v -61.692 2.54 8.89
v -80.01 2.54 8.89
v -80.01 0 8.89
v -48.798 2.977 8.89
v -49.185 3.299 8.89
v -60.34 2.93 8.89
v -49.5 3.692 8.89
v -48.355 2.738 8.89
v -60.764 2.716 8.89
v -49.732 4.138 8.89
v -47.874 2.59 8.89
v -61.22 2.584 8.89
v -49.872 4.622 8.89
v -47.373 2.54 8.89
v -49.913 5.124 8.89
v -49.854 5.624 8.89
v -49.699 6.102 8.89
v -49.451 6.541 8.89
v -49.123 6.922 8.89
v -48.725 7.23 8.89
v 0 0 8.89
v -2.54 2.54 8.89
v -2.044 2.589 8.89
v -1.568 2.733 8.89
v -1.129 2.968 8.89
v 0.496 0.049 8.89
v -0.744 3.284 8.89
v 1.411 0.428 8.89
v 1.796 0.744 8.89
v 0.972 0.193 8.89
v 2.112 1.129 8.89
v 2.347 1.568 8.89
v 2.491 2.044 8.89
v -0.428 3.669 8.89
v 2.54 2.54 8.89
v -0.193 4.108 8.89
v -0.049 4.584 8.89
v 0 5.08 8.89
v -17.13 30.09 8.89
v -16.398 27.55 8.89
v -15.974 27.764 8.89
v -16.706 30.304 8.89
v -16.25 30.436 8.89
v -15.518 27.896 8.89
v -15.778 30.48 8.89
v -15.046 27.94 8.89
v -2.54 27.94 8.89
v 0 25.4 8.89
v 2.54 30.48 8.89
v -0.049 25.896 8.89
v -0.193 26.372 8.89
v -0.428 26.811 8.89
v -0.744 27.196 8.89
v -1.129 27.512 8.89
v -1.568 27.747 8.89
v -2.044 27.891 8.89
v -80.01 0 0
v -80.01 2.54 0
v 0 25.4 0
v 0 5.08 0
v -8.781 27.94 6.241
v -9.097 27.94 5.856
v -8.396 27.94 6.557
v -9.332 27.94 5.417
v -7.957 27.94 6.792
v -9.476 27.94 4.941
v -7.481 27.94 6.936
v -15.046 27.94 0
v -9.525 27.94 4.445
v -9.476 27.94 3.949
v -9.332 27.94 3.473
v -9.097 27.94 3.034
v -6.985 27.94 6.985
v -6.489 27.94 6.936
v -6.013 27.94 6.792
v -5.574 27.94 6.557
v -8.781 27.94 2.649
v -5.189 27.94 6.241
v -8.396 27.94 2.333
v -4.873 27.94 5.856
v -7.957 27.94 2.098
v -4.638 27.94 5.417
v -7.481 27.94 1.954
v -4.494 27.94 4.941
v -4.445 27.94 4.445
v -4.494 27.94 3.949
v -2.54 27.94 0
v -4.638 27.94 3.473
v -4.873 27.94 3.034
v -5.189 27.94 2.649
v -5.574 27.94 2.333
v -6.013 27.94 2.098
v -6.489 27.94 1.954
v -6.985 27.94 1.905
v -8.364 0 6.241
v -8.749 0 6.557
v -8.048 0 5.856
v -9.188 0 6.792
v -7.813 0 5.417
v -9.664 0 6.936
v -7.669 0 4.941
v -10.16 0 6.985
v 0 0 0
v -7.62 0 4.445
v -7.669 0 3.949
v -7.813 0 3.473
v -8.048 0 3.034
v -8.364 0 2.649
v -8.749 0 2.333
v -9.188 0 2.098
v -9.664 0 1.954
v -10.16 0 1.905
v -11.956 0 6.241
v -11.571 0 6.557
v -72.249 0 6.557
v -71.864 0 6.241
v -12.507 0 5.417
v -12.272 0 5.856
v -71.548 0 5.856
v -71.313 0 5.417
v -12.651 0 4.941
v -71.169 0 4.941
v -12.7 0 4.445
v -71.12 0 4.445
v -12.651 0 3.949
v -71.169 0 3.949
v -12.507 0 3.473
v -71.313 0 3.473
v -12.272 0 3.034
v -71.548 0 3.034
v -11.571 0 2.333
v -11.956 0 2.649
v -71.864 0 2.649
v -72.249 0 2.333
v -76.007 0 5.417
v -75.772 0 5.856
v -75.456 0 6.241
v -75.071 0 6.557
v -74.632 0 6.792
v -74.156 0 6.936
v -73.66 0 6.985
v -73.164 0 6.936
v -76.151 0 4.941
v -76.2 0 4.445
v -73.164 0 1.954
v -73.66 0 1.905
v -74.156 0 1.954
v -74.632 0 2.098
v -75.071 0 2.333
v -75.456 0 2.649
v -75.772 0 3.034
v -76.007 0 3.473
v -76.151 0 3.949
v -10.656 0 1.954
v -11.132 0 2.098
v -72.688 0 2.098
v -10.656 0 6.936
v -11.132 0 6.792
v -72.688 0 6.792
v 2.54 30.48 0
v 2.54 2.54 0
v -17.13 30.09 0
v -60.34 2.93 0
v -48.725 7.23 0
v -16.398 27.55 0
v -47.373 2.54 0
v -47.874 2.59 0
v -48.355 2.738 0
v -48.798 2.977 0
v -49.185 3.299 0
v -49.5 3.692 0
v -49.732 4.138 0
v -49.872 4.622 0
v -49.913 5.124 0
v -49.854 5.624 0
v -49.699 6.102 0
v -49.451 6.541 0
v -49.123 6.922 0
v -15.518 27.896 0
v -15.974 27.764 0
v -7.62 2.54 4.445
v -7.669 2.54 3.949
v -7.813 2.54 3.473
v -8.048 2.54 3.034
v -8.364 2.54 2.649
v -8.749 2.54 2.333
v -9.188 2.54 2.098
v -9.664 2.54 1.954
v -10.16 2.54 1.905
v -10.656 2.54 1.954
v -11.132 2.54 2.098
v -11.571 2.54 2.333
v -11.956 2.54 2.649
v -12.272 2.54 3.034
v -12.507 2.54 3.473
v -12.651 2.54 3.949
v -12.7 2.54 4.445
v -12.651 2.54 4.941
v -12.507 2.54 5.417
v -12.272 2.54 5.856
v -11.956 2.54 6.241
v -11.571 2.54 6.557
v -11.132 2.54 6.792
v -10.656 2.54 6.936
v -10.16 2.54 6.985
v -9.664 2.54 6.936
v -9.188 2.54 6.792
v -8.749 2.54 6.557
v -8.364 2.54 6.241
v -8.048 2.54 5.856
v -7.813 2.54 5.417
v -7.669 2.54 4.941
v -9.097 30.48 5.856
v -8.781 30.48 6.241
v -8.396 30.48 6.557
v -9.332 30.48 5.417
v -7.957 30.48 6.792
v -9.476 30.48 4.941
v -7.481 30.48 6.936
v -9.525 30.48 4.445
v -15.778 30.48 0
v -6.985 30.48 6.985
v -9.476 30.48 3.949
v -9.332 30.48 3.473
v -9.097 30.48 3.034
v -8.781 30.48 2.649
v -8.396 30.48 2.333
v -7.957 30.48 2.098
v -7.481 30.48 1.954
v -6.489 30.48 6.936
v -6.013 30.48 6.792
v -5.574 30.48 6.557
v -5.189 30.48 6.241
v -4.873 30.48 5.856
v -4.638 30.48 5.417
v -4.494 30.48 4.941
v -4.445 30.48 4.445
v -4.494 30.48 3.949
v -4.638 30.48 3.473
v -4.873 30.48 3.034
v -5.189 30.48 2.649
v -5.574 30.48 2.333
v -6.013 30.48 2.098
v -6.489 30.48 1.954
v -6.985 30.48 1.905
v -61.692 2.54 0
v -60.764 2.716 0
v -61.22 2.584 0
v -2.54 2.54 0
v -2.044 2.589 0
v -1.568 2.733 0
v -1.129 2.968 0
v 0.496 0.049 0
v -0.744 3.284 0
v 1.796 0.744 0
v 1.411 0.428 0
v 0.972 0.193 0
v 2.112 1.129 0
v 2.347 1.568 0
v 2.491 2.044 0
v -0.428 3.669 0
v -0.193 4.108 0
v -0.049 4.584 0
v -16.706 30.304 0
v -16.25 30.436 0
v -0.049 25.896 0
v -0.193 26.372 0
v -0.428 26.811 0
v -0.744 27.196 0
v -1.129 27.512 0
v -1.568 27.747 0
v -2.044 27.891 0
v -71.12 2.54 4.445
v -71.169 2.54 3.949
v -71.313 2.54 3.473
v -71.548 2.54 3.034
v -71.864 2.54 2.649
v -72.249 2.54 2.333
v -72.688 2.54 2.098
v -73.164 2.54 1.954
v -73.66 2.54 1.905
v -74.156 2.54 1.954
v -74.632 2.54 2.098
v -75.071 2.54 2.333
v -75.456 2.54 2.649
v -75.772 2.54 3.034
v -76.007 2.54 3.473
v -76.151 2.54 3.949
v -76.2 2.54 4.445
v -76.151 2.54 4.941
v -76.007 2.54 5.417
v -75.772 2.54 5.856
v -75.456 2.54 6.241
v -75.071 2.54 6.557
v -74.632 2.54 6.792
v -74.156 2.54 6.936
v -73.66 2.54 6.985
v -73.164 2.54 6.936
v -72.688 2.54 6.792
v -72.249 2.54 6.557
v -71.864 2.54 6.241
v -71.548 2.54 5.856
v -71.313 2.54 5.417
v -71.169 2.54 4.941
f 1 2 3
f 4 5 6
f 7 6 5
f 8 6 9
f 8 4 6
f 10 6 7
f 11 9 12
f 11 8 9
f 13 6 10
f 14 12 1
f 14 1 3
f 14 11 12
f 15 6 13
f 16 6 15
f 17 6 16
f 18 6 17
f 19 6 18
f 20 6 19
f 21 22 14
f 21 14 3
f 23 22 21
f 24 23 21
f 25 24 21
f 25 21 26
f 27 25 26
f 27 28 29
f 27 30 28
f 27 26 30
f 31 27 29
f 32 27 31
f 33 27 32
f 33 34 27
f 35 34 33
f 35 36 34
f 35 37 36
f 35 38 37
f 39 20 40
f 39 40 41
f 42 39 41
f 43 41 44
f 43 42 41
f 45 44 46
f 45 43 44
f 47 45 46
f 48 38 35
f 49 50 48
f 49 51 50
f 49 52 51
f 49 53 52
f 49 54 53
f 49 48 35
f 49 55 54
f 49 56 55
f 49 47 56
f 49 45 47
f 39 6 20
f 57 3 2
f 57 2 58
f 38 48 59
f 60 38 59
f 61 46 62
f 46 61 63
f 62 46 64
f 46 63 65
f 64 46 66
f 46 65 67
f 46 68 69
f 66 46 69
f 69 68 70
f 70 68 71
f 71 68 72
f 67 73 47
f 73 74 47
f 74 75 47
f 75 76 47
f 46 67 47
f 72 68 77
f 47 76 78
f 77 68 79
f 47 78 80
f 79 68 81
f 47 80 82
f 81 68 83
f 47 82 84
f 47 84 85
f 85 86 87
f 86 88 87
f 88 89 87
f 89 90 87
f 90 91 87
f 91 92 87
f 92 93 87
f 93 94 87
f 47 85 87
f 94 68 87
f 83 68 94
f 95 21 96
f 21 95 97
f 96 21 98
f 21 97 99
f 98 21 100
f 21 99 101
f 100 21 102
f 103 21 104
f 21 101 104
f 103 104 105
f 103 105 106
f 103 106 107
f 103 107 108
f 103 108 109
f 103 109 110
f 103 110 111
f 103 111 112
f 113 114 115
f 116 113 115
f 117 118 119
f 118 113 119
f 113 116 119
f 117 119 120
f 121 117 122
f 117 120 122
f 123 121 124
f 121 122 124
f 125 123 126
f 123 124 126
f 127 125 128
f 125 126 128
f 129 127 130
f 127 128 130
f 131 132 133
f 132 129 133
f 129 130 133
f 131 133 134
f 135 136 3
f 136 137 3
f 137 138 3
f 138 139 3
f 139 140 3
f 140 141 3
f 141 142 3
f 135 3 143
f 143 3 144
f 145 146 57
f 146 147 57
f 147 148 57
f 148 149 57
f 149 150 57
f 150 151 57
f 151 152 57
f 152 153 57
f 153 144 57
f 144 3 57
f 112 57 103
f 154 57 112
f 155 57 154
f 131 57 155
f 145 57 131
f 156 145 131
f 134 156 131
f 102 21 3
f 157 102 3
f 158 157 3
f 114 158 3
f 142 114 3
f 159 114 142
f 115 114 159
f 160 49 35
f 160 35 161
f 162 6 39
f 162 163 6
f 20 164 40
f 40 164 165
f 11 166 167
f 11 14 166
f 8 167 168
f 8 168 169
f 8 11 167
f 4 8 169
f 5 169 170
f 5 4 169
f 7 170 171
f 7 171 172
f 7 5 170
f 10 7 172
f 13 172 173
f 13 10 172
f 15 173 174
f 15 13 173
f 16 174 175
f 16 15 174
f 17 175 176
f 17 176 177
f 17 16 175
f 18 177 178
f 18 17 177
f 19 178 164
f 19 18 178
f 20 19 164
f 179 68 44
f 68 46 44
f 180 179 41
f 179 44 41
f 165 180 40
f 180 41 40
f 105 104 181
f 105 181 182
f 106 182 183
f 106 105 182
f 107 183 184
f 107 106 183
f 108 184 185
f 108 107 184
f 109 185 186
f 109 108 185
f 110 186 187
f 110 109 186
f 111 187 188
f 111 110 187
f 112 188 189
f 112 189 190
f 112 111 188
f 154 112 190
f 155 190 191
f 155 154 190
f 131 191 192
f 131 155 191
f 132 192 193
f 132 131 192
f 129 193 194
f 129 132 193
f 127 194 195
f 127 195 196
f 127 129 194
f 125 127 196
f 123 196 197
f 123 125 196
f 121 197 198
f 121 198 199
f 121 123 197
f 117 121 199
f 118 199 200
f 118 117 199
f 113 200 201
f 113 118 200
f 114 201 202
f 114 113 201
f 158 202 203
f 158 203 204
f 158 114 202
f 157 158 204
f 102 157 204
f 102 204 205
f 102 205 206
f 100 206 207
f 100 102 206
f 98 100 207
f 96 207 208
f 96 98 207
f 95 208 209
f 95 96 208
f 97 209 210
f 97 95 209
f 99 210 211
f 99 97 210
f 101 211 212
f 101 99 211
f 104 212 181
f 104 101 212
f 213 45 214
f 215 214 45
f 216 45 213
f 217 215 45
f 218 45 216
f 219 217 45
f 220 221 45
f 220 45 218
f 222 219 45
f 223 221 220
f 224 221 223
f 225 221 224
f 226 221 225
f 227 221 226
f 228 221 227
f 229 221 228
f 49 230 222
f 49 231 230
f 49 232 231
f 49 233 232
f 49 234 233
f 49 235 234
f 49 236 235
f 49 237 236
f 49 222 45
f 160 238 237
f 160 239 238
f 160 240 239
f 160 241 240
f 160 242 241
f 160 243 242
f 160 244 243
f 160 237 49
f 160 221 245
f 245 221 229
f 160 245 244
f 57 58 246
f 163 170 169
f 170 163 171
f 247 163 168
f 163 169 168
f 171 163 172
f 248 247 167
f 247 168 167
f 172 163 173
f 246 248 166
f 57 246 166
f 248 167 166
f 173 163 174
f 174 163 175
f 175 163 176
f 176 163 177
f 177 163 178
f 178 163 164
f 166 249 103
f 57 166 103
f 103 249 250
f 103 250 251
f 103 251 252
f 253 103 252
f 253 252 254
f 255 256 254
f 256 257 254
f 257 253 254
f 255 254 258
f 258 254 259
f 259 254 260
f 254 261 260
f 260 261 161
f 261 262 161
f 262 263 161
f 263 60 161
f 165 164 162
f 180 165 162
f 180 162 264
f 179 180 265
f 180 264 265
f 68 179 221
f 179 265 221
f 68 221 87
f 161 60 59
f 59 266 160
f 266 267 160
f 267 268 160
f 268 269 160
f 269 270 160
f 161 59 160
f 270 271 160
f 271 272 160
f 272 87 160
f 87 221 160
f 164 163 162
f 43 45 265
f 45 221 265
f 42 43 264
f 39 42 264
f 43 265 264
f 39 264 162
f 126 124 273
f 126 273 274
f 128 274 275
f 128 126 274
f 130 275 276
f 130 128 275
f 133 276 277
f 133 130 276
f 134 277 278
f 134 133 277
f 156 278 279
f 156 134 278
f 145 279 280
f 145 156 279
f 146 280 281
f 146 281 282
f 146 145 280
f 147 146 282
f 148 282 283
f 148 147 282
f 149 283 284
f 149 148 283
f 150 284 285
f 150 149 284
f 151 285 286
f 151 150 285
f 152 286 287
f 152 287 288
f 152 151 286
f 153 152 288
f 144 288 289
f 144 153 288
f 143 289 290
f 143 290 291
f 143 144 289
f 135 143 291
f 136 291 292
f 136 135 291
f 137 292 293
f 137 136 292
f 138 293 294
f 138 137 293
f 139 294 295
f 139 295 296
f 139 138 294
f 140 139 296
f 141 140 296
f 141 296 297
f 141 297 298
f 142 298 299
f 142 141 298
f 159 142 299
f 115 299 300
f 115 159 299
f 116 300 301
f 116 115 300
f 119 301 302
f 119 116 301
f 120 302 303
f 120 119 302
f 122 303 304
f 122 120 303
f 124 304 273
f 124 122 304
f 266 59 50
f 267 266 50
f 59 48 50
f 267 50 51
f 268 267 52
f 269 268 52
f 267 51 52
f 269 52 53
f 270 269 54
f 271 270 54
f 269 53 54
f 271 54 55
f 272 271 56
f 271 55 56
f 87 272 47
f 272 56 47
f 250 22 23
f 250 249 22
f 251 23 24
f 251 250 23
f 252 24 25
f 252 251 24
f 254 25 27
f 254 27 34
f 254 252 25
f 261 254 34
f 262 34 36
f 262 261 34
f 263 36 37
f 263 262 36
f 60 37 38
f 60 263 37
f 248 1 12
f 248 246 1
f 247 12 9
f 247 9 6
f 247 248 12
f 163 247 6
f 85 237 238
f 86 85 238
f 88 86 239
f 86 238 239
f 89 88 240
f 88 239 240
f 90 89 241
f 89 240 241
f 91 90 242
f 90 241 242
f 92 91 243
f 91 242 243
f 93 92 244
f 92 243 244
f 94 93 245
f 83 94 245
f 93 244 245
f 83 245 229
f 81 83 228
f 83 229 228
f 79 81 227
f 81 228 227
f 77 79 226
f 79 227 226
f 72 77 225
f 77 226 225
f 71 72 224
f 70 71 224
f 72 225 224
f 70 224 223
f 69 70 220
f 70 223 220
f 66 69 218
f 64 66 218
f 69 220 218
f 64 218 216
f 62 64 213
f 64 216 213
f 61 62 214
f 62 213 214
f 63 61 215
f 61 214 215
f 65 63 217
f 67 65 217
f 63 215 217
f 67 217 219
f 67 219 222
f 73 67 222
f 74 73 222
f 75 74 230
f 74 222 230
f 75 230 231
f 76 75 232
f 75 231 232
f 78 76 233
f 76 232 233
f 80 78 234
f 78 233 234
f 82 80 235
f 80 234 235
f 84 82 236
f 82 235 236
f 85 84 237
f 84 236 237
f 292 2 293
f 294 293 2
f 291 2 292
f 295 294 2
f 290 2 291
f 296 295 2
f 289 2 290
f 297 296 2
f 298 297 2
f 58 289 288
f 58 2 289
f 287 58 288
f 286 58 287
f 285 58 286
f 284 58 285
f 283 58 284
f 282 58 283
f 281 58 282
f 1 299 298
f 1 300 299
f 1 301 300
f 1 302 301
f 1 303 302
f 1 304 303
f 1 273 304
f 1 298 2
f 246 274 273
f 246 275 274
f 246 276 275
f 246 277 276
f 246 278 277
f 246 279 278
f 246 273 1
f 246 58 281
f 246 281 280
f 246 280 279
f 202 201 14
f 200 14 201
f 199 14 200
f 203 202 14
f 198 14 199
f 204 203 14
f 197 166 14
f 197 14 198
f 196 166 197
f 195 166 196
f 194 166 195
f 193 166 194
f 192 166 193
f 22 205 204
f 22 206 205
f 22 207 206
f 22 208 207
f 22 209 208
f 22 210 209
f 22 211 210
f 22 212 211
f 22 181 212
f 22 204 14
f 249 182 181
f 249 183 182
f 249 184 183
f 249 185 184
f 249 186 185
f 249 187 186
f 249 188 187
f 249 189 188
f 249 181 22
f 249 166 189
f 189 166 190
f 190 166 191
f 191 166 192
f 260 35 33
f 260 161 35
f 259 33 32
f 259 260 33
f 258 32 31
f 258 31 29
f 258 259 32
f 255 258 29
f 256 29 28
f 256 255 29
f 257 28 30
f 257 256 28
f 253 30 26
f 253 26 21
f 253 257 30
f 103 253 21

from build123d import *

# Parameters (mm, degrees)
SKETCH1_W           = 80.01
SKETCH1_H           = 8.89
SKETCH1_R           = 2.54
BOSS_EXTRUDE1_DEPTH = 2.54
SKETCH2_W           = 8.89
SKETCH2_H           = 30.48
BOSS_EXTRUDE2_DEPTH = 2.54
SKETCH3_W           = 19.05
SKETCH3_H           = 8.89
SKETCH3_R           = 2.54
BOSS_EXTRUDE3_DEPTH = 2.54
SKETCH6_W           = 52.501867586
SKETCH6_H           = 8.89
BOSS_EXTRUDE4_DEPTH = 2.54
FILLET1_R           = 2.54


with BuildPart() as part:
    # Sketch1 → Boss-Extrude1 (new body)
    with BuildSketch(Plane(origin=(0, 0, 0), x_dir=(1, 0, 0), z_dir=(0, 1, 0))):
        with Locations((-40.005, -4.445)):
            Rectangle(SKETCH1_W, SKETCH1_H)
        with Locations((-73.66, -4.445)):
            Circle(SKETCH1_R, mode=Mode.SUBTRACT)
        with Locations((-10.16, -4.445)):
            Circle(SKETCH1_R, mode=Mode.SUBTRACT)
    extrude(amount=BOSS_EXTRUDE1_DEPTH)

    # Sketch2 → Boss-Extrude2 (add)
    with BuildSketch(Plane(origin=(0, 0, 0), x_dir=(0, 0, -1), z_dir=(1, 0, 0))):
        with Locations((-4.445, 15.24)):
            Rectangle(SKETCH2_W, SKETCH2_H)
    extrude(amount=BOSS_EXTRUDE2_DEPTH)

    # Sketch3 → Boss-Extrude3 (add)
    with BuildSketch(Plane(origin=(0, 30.48, 0), x_dir=(1, 0, 0), z_dir=(0, 1, 0))):
        with Locations((-6.985, -4.445)):
            Rectangle(SKETCH3_W, SKETCH3_H)
        with Locations((-6.985, -4.445)):
            Circle(SKETCH3_R, mode=Mode.SUBTRACT)
    extrude(amount=-BOSS_EXTRUDE3_DEPTH)

    # Sketch6 → Boss-Extrude4 (add)
    with BuildSketch(Plane(origin=(-18.408683441, 29.286541837, 0), x_dir=(0.846636549, 0.532171545, 0), z_dir=(-0.532171545, 0.846636549, 0))):
        with Locations((-24.008314522, -4.445)):
            Rectangle(SKETCH6_W, SKETCH6_H)
    extrude(amount=-BOSS_EXTRUDE4_DEPTH)

    # Fillet1
    fillet1_edges = [part.edges().sort_by_distance(p)[0] for p in [
        (2.54, 0, 4.445),
        (0, 2.54, 4.445),
        (0, 27.94, 4.445),
        (-16.51, 30.48, 4.445),
        (-15.778012038, 27.94, 4.445),
        (-56.187102947, 2.54, 4.445),
        (-60.96, 2.54, 4.445),
    ]]
    fillet(fillet1_edges, radius=FILLET1_R)


solid = part.part
